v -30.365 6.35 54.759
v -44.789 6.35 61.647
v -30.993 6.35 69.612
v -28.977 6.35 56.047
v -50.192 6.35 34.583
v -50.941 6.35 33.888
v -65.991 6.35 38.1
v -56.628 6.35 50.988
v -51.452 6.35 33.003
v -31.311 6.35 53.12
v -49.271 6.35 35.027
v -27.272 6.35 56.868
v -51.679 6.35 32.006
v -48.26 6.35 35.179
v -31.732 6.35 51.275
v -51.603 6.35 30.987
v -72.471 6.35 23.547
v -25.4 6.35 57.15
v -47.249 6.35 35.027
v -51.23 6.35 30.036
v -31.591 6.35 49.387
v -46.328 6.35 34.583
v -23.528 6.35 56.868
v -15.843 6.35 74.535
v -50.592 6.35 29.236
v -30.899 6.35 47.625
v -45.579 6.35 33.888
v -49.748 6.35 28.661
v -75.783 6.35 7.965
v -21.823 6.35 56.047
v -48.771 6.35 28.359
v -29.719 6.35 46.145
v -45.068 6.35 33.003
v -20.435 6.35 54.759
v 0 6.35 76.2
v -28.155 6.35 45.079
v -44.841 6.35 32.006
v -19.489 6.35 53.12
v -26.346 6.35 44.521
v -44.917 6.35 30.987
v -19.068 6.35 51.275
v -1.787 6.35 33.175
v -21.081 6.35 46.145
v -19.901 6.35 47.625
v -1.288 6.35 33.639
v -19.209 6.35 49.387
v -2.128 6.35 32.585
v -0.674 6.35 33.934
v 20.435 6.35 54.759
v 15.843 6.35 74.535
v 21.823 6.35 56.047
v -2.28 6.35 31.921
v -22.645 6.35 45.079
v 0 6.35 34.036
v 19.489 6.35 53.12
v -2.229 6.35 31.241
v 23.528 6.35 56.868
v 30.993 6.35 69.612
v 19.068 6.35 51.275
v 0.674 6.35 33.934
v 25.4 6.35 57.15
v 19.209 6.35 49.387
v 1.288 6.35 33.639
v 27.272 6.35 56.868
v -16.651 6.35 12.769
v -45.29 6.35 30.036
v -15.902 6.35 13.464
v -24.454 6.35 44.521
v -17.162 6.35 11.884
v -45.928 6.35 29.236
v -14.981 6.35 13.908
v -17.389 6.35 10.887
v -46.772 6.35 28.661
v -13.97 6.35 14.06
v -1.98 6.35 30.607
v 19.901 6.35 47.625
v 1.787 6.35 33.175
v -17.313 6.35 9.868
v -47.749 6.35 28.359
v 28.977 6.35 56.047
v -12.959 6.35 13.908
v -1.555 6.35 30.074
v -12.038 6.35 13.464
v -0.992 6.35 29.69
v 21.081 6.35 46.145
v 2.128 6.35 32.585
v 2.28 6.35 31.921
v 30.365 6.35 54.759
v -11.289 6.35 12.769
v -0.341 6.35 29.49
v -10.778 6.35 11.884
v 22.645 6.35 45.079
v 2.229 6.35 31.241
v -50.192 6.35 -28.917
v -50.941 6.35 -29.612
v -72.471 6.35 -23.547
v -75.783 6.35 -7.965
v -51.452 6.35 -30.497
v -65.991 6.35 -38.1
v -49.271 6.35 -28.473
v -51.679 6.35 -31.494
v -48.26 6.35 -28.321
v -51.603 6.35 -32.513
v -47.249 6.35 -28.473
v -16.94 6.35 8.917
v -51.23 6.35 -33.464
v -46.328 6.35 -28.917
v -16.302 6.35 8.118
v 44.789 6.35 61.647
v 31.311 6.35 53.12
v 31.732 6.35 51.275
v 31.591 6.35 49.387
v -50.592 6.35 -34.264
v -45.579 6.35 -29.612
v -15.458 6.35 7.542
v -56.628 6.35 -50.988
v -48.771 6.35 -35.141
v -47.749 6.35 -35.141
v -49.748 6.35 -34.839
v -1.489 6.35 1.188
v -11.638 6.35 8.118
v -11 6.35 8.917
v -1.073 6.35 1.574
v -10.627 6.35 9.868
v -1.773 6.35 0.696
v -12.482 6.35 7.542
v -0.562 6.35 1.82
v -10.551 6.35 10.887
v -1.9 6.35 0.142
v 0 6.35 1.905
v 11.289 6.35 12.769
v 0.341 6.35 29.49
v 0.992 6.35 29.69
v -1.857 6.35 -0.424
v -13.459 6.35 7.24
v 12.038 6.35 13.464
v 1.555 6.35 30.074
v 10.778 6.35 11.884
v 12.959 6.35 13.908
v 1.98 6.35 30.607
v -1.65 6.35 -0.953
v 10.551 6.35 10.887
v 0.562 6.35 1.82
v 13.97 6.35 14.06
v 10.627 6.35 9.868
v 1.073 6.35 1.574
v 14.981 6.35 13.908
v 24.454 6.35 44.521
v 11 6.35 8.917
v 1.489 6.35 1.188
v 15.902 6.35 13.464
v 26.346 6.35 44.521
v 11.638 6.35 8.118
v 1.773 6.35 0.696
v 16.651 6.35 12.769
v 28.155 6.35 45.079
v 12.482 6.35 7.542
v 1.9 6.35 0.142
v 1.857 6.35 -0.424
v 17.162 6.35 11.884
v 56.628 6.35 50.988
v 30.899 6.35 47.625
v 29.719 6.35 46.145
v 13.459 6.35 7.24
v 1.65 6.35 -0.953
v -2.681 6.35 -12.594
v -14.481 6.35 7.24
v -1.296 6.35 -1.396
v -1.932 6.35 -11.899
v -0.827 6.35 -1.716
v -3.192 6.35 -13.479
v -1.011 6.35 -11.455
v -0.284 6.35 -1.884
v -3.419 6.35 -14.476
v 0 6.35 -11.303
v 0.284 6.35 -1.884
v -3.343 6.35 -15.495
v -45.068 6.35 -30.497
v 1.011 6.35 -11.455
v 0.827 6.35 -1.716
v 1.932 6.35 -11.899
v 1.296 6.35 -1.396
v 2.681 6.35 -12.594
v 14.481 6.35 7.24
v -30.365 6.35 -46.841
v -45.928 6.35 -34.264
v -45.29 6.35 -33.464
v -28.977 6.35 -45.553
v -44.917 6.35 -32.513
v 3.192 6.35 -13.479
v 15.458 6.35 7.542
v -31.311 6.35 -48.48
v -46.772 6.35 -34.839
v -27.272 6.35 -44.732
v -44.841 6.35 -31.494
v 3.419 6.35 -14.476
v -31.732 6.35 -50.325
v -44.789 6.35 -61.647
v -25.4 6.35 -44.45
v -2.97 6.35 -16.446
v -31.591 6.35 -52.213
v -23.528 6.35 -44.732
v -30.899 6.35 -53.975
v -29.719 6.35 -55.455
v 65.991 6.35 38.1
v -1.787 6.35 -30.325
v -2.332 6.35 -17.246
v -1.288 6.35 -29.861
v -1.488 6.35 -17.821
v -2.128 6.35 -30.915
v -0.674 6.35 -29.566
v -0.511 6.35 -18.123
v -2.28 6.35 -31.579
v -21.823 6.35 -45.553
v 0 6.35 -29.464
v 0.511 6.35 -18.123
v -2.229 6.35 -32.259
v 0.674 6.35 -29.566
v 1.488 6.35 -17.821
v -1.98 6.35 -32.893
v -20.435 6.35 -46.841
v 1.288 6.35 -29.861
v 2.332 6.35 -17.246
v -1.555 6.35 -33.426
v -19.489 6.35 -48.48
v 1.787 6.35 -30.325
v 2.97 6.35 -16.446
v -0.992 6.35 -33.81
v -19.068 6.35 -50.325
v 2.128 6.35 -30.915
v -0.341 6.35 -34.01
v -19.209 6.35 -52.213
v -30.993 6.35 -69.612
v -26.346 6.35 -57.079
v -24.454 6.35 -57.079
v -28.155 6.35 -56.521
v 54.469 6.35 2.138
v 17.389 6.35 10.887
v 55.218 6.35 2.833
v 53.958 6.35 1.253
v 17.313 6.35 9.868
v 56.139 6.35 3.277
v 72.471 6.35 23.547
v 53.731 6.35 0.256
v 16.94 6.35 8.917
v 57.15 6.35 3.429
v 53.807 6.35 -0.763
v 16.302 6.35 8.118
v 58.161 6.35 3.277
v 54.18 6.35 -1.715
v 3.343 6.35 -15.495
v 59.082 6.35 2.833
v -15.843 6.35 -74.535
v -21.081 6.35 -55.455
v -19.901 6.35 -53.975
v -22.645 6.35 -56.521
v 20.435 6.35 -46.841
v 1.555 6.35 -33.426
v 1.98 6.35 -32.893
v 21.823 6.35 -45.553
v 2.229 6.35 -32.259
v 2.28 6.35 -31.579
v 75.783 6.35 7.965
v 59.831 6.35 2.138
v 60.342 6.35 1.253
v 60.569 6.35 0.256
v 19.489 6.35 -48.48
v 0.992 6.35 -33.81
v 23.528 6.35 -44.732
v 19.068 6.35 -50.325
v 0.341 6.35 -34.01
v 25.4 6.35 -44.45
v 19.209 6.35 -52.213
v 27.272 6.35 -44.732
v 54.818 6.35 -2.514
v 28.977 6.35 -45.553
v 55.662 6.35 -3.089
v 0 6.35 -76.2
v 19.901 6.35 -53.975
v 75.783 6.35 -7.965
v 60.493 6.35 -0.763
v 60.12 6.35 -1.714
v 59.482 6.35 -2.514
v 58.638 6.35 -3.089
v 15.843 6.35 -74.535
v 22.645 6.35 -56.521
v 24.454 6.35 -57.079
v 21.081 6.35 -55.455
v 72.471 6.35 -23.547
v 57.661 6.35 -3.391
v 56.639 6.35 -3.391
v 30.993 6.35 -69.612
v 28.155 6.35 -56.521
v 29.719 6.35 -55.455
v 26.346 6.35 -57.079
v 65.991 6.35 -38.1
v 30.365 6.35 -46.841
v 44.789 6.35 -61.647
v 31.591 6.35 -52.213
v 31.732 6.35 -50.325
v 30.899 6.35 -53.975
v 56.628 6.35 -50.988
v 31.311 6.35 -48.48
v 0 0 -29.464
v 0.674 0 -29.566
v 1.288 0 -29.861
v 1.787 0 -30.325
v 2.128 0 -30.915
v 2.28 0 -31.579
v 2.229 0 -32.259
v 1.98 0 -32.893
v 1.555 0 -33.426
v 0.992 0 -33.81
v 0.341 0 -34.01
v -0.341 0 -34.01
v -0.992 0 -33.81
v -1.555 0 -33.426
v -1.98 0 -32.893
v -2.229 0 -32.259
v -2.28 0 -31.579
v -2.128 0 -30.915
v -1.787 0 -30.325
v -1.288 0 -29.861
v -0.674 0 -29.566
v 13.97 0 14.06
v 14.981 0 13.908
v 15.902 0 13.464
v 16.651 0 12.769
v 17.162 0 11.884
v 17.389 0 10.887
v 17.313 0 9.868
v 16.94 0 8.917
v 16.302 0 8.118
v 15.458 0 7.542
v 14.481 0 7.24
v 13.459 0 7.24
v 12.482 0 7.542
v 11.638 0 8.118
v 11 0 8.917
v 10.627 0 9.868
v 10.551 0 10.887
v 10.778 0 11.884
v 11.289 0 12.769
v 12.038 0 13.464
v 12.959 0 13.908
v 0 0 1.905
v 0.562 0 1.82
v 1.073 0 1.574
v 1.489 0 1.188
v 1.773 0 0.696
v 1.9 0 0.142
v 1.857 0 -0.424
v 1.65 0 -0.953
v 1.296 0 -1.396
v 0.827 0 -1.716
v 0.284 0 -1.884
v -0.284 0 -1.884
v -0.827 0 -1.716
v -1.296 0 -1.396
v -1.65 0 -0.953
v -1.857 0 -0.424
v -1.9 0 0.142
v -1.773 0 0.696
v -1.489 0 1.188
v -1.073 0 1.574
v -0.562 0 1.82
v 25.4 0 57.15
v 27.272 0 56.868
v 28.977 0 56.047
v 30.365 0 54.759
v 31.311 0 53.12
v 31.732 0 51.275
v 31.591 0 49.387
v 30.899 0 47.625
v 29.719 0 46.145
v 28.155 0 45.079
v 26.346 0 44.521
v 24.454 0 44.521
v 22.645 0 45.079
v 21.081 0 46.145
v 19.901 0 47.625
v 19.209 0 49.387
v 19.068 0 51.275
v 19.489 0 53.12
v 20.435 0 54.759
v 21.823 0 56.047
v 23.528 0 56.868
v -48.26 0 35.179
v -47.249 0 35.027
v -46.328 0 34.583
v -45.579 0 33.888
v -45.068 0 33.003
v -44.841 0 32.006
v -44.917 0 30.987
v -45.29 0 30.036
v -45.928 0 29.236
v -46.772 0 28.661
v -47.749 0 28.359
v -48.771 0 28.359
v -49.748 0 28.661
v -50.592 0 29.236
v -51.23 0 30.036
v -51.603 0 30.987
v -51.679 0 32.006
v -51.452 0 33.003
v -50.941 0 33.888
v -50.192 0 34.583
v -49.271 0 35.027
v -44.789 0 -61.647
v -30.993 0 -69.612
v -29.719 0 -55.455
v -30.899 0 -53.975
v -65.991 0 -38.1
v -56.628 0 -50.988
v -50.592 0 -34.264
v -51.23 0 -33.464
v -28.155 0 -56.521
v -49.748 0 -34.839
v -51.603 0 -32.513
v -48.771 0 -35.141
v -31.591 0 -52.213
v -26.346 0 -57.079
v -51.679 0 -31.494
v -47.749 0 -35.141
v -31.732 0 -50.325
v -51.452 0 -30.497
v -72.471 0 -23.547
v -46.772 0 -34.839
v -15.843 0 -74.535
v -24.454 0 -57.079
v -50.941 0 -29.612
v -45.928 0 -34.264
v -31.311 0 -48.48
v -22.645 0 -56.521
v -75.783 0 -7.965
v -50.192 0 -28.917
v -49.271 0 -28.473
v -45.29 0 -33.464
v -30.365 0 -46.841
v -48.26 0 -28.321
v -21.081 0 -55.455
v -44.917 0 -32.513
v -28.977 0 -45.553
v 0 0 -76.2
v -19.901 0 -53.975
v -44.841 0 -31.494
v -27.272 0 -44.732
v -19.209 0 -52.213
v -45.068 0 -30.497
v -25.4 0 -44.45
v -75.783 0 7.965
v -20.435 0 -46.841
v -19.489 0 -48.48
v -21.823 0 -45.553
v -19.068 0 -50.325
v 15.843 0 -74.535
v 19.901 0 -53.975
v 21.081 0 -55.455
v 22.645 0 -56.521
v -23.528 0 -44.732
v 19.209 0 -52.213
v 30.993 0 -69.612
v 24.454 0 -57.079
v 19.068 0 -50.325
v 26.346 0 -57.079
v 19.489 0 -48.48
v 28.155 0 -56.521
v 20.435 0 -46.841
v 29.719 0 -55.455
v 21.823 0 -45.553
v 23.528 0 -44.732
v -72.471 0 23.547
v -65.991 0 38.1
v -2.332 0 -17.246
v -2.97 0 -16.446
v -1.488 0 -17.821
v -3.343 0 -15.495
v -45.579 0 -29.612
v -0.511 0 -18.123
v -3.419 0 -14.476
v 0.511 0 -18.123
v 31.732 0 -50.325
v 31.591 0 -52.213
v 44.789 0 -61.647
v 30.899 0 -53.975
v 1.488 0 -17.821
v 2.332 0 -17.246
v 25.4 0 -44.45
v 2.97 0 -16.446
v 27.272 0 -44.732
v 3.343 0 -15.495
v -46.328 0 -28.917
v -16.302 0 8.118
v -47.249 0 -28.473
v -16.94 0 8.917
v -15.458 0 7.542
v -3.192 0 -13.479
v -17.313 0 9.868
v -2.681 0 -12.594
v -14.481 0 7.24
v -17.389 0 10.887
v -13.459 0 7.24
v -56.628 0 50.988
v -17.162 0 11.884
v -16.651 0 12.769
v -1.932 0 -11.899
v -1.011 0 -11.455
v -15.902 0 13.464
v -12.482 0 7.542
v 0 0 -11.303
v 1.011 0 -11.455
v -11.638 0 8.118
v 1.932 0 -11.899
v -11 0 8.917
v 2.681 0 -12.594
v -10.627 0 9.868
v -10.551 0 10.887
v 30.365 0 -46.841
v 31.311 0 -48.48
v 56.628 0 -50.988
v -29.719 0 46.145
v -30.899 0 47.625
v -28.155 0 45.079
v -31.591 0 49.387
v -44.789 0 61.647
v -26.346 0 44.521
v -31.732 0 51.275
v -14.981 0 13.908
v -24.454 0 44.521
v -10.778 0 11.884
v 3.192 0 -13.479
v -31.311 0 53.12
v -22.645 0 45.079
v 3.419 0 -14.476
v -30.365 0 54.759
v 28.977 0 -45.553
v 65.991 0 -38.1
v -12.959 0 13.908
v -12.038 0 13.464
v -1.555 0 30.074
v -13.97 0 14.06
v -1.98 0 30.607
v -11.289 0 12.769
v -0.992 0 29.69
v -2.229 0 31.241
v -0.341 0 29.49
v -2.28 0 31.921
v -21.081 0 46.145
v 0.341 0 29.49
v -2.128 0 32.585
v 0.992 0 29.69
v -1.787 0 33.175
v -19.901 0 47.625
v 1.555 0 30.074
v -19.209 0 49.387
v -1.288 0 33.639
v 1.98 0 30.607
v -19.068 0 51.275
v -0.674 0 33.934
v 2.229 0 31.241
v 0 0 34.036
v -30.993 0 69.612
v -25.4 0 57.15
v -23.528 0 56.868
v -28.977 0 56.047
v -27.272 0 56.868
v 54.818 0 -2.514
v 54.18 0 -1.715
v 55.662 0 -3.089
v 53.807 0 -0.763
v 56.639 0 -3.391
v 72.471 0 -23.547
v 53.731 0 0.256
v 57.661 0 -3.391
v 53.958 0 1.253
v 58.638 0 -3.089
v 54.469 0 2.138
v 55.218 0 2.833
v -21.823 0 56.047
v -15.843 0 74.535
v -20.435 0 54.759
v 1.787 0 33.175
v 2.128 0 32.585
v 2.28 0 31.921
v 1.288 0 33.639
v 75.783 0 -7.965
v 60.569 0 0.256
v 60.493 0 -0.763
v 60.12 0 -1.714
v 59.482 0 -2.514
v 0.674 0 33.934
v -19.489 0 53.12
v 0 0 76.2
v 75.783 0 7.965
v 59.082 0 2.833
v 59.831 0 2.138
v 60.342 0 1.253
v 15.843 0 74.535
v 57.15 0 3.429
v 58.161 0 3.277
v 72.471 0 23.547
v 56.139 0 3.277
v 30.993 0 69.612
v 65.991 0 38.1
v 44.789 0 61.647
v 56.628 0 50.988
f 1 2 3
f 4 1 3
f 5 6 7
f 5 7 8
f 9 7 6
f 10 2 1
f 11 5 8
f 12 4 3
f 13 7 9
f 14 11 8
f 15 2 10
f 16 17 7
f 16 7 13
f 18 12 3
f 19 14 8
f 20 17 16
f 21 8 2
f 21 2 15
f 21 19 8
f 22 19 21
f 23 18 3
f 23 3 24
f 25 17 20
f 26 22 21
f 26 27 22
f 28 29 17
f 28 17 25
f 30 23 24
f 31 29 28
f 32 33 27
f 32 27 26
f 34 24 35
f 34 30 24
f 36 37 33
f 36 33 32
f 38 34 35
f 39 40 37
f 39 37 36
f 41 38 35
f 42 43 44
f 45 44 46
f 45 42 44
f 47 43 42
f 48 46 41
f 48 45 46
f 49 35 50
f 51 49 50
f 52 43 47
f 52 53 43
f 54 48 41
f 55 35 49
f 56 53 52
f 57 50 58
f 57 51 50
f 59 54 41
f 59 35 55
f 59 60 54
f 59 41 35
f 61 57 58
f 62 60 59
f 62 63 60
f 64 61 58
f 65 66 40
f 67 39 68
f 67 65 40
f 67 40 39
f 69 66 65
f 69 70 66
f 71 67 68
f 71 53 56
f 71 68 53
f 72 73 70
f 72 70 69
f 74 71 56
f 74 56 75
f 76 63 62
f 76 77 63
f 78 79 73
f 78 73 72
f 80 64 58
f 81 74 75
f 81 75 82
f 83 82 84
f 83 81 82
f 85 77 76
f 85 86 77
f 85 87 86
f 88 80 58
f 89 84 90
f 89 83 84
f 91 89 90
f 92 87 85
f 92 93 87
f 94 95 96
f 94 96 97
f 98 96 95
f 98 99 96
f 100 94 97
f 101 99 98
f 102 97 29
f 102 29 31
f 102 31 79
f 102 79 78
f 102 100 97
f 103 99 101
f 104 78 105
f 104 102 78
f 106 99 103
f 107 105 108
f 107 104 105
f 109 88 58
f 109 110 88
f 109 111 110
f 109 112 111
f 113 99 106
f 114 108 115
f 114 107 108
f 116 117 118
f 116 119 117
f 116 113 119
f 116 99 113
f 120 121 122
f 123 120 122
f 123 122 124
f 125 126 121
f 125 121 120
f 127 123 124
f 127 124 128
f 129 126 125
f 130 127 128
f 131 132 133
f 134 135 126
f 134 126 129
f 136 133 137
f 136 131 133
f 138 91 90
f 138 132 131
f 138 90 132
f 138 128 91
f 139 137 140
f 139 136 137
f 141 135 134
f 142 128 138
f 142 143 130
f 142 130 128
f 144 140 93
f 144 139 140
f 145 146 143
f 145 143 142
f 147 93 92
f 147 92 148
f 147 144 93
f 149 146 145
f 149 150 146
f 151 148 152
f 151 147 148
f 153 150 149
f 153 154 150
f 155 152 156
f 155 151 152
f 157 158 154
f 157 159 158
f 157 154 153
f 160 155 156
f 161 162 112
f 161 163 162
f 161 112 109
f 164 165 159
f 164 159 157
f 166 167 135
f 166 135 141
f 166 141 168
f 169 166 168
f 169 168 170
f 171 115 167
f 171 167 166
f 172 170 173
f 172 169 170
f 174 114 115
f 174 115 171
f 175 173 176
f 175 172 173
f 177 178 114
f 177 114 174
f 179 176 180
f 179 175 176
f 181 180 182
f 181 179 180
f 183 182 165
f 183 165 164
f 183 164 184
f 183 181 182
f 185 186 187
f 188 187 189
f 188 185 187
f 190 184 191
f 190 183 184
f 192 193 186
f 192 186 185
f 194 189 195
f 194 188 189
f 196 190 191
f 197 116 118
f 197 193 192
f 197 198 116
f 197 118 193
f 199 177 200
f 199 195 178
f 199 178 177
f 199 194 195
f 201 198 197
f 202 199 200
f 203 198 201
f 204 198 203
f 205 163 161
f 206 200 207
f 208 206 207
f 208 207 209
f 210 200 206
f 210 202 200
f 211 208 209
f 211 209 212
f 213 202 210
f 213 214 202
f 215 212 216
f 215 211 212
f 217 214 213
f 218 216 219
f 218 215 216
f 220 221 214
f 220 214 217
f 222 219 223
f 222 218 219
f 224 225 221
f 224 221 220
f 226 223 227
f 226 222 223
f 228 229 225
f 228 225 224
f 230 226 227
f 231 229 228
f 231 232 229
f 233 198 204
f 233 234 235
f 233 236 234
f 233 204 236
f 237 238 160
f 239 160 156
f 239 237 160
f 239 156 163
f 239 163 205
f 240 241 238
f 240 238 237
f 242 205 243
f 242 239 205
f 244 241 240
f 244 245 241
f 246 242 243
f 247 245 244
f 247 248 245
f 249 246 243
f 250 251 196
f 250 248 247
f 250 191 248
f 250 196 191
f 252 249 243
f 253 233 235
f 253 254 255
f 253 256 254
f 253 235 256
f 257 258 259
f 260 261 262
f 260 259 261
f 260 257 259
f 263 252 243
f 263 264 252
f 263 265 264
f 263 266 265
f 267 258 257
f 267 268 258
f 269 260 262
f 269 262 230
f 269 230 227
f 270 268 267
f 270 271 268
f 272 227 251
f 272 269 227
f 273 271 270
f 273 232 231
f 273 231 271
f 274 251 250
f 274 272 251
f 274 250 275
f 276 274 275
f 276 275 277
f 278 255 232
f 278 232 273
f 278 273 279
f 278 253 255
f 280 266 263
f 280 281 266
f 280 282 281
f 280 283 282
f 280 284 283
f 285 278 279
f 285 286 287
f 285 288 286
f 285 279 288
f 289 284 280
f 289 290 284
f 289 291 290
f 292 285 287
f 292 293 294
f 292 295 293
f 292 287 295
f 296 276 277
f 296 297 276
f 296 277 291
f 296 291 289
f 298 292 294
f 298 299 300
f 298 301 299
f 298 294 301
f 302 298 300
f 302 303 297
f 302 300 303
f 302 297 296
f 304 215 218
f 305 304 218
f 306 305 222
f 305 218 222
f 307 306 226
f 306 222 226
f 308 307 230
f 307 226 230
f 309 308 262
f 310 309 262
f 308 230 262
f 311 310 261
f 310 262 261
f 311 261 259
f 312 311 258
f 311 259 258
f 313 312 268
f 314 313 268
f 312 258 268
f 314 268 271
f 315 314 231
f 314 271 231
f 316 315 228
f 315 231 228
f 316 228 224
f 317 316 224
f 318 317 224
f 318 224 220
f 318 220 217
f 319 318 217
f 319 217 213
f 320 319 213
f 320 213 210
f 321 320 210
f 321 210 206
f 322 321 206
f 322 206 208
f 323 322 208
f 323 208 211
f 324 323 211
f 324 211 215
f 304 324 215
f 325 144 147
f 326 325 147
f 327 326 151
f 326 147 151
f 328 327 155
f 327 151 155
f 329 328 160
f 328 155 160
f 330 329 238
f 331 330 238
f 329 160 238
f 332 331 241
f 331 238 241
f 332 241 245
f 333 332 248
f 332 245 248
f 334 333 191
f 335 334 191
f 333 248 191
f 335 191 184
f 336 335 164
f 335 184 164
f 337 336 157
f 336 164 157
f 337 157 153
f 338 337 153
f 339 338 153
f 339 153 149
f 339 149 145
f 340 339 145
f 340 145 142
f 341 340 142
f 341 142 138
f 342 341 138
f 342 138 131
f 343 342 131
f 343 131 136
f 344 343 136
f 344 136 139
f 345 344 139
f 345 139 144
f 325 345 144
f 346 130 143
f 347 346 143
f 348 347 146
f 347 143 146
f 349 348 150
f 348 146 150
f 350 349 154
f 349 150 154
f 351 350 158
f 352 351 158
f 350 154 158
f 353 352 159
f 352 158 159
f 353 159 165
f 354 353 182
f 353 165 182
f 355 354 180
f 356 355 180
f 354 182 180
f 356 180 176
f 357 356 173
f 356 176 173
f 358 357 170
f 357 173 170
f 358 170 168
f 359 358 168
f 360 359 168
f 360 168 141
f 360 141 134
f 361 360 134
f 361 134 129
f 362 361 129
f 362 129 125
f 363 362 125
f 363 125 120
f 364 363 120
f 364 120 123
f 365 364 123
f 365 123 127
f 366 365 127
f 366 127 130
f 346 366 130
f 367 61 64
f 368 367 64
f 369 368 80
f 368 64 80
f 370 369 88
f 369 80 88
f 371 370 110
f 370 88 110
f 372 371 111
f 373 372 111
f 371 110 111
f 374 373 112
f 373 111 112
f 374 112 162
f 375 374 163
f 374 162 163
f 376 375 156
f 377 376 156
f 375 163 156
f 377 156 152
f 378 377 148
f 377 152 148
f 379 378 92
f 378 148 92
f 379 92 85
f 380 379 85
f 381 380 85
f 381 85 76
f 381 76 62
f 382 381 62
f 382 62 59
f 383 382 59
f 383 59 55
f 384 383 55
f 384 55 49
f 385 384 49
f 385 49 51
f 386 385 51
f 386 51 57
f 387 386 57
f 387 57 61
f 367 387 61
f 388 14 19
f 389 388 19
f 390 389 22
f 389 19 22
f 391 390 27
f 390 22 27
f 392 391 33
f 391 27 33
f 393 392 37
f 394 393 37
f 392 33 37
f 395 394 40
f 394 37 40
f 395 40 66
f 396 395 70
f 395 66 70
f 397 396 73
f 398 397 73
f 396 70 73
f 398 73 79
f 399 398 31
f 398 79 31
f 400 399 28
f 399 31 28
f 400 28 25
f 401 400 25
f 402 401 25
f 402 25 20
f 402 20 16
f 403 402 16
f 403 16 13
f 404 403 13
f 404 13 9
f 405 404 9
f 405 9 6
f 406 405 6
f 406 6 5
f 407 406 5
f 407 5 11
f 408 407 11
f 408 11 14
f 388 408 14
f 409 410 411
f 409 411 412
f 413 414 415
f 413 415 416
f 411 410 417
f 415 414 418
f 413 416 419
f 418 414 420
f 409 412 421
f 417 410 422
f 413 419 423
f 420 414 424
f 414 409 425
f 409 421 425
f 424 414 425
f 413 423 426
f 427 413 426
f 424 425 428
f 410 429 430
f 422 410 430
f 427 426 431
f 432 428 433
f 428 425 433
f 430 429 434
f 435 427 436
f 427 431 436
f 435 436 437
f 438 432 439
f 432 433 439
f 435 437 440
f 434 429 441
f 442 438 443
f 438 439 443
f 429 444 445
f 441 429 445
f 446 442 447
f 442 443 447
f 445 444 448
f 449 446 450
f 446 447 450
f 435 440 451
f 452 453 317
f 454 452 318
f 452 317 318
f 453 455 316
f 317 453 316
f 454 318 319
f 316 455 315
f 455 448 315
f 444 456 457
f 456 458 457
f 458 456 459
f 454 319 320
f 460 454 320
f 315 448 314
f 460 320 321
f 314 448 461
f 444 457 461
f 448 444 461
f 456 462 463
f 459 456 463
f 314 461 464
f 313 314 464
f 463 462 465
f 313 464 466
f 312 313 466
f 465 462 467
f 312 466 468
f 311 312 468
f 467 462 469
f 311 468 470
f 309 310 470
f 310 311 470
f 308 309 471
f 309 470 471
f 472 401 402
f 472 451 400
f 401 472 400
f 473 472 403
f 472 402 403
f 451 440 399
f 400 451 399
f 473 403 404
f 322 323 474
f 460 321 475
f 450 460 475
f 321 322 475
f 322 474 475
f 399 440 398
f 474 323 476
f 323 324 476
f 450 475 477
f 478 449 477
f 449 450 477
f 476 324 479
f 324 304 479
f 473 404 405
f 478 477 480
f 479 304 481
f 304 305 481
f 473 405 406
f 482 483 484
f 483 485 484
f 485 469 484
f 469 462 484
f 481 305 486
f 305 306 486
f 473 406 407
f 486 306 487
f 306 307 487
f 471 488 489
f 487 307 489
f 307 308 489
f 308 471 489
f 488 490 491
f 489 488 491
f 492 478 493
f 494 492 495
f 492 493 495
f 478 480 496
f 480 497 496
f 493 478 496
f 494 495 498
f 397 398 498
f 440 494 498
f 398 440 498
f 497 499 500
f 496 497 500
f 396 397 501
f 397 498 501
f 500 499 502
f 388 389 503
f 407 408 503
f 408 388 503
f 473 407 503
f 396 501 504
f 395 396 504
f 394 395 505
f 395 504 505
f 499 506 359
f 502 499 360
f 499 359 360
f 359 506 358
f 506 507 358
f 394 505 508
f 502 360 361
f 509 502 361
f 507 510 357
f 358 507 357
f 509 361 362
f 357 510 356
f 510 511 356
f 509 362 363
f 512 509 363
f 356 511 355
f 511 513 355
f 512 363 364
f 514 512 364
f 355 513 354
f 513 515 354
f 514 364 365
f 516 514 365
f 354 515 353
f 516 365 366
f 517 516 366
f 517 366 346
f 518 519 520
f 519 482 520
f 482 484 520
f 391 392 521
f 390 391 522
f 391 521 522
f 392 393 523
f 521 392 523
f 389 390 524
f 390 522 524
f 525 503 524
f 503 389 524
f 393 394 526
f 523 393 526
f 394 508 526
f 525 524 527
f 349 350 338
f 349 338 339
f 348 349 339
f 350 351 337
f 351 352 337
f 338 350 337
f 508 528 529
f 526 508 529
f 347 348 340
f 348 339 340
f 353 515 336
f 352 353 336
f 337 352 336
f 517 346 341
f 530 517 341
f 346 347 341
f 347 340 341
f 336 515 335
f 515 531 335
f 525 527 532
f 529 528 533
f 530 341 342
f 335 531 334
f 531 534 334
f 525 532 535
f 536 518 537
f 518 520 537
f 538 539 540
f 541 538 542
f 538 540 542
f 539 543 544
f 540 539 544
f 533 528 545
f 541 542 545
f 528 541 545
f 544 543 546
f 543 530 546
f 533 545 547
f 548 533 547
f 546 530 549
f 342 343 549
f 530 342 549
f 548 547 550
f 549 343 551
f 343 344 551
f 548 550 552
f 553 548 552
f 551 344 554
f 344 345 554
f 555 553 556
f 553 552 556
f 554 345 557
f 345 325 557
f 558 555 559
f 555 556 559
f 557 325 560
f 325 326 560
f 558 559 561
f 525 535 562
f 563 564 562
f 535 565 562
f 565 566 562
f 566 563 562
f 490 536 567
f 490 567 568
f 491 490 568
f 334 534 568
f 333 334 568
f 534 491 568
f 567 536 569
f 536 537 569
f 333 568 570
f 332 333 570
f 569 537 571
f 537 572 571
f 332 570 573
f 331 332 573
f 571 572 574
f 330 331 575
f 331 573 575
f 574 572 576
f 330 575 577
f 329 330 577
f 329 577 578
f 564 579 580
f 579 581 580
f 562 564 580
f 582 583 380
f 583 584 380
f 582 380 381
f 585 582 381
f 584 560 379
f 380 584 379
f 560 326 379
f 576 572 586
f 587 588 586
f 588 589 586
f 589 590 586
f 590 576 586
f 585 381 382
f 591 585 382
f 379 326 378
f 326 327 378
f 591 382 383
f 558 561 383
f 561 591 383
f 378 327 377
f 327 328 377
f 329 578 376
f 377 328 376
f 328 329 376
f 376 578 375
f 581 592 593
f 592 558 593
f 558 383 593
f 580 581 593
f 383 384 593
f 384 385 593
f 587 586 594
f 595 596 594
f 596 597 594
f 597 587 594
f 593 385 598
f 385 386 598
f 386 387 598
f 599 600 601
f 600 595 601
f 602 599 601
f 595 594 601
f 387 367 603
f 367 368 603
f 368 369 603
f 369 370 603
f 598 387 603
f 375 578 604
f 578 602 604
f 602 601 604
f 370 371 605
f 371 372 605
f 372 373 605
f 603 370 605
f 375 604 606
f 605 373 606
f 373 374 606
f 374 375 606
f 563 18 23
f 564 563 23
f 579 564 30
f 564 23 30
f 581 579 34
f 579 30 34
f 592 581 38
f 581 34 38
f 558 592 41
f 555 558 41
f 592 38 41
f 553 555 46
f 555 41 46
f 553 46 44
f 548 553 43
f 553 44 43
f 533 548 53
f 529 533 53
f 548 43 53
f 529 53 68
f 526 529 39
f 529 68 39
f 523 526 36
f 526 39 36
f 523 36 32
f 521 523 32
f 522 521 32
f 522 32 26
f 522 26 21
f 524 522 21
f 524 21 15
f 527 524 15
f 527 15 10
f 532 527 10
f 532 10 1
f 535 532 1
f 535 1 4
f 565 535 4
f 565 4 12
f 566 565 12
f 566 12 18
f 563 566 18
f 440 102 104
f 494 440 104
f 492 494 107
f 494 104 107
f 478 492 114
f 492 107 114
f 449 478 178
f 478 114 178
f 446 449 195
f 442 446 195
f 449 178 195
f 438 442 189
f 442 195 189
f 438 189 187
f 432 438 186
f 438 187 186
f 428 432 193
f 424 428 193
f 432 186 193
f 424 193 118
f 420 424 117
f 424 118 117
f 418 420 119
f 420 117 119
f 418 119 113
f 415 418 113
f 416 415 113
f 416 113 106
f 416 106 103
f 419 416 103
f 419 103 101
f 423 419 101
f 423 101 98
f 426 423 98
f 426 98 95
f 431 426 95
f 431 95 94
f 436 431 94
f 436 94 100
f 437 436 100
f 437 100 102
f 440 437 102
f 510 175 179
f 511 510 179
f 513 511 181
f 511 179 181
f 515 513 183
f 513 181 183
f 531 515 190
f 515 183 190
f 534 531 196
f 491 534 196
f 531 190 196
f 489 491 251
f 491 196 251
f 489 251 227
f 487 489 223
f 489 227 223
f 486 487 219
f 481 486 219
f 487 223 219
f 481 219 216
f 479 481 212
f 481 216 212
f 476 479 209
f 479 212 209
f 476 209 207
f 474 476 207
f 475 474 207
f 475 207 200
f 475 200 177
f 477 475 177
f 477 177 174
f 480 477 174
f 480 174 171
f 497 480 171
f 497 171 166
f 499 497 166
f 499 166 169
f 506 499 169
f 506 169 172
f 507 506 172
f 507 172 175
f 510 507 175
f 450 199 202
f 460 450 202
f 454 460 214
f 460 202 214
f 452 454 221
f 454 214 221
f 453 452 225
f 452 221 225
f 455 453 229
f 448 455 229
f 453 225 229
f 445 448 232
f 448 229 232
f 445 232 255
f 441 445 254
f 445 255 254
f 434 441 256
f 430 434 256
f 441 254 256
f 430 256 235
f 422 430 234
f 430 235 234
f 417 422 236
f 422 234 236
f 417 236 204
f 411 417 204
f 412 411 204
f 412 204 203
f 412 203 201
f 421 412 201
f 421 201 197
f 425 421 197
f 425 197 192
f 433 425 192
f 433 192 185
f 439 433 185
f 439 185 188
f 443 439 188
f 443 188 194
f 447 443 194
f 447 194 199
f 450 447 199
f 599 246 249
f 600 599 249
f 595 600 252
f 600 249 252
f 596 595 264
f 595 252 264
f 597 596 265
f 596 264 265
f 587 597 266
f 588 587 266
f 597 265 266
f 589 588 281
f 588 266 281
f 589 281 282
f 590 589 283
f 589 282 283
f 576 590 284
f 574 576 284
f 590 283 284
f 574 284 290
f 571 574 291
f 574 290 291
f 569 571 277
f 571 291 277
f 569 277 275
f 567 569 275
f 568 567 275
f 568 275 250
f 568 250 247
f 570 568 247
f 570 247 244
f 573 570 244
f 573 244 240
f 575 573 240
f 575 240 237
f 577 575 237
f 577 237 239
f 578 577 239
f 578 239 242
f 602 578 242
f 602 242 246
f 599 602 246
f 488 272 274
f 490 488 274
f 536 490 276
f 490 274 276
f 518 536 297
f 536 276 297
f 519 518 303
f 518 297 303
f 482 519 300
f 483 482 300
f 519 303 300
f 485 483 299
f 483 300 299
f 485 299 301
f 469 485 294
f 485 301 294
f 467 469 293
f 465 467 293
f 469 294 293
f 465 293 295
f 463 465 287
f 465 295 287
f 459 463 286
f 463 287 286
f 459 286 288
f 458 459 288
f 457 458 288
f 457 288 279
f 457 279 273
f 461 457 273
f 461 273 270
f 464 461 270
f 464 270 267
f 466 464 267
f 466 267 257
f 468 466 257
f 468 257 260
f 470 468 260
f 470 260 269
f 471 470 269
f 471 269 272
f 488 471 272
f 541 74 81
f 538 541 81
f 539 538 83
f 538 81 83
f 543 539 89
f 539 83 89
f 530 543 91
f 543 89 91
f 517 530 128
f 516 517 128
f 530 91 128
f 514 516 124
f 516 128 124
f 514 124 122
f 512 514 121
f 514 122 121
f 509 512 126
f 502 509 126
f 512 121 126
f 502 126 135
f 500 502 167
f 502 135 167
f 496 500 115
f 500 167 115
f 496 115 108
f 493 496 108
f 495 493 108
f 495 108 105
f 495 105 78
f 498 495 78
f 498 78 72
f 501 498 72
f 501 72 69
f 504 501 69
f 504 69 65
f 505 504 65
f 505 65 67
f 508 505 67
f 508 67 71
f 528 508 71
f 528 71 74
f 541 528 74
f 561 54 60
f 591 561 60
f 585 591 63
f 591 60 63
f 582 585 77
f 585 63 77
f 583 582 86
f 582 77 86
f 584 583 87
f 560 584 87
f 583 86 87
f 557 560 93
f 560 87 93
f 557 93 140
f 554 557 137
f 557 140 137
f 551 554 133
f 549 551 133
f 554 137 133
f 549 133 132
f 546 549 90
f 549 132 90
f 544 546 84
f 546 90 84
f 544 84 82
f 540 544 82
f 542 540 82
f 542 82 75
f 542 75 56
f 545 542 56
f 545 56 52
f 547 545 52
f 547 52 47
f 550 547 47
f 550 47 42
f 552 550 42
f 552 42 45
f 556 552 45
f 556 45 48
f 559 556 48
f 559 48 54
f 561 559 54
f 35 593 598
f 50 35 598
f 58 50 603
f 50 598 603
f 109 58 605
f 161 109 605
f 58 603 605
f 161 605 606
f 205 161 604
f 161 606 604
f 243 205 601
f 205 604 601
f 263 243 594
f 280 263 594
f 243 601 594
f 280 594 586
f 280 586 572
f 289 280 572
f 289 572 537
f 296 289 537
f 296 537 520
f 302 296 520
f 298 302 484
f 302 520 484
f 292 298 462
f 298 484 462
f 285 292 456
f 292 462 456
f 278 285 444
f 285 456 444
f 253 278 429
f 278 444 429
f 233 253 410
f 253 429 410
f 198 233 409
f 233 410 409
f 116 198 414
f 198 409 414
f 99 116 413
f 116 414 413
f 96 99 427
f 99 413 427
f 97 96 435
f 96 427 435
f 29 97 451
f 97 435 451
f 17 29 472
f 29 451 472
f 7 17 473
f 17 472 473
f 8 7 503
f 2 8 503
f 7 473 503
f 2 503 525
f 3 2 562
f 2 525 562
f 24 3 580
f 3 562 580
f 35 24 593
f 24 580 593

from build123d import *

# Parameters (mm, degrees)
SKETCH1_R           = 76.2
BOSS_EXTRUDE1_DEPTH = 6.35
SKETCH2_R           = 1.905
CUT_EXTRUDE1_DEPTH  = 108.95
SKETCH3_R           = 3.429
CUT_EXTRUDE2_DEPTH  = 108.95
SKETCH4_R           = 6.35
CUT_EXTRUDE3_DEPTH  = 108.95
SKETCH5_R           = 6.35
CUT_EXTRUDE4_DEPTH  = 108.95
SKETCH7_R           = 2.54
CUT_EXTRUDE6_DEPTH  = 108.95
SKETCH8_R           = 3.429
CUT_EXTRUDE7_DEPTH  = 108.95
SKETCH9_R           = 3.429
CUT_EXTRUDE8_DEPTH  = 108.95
SKETCH10_R          = 2.54
BOSS_EXTRUDE2_DEPTH = 6.35
SKETCH11_R          = 2.286
CUT_EXTRUDE9_DEPTH  = 108.95


with BuildPart() as part:
    # Sketch1 → Boss-Extrude1 (new body)
    with BuildSketch(Plane(origin=(0, 0, 0), x_dir=(1, 0, 0), z_dir=(0, 1, 0))):
        with Locations(Location((0, 0, 0), (0, 0, 270))):
            Circle(SKETCH1_R)
    extrude(amount=BOSS_EXTRUDE1_DEPTH)

    # Sketch2 → Cut-Extrude1 (cut, through all)
    with BuildSketch(Plane(origin=(0, 6.35, 0), x_dir=(1, 0, 0), z_dir=(0, 1, 0))):
        with Locations(Location((0, 0, 0), (0, 0, 270))):
            Circle(SKETCH2_R)
    extrude(amount=-CUT_EXTRUDE1_DEPTH, mode=Mode.SUBTRACT)

    # Sketch3 → Cut-Extrude2 (cut, through all)
    with BuildSketch(Plane(origin=(0, 6.35, 0), x_dir=(1, 0, 0), z_dir=(0, 1, 0))):
        with Locations(Location((0, 14.732, 0), (0, 0, 270))):
            Circle(SKETCH3_R)
        with Locations(Location((-13.97, -10.631143259, 0), (0, 0, 270))):
            Circle(SKETCH3_R)
        with Locations(Location((13.97, -10.631143259, 0), (0, 0, 270))):
            Circle(SKETCH3_R)
    extrude(amount=-CUT_EXTRUDE2_DEPTH, mode=Mode.SUBTRACT)

    # Sketch4 → Cut-Extrude3 (cut, through all)
    with BuildSketch(Plane(origin=(0, 6.35, 0), x_dir=(1, 0, 0), z_dir=(0, 1, 0))):
        with Locations(Location((-25.4, -50.8, 0), (0, 0, 270))):
            Circle(SKETCH4_R)
        with Locations(Location((25.4, -50.8, 0), (0, 0, 270))):
            Circle(SKETCH4_R)
    extrude(amount=-CUT_EXTRUDE3_DEPTH, mode=Mode.SUBTRACT)

    # Sketch5 → Cut-Extrude4 (cut, through all)
    with BuildSketch(Plane(origin=(0, 6.35, 0), x_dir=(1, 0, 0), z_dir=(0, 1, 0))):
        with Locations(Location((-25.4, 50.8, 0), (0, 0, 270))):
            Circle(SKETCH5_R)
        with Locations(Location((25.4, 50.8, 0), (0, 0, 270))):
            Circle(SKETCH5_R)
    extrude(amount=-CUT_EXTRUDE4_DEPTH, mode=Mode.SUBTRACT)

    # Sketch7 → Cut-Extrude6 (cut, through all)
    with BuildSketch(Plane(origin=(0, 6.35, 0), x_dir=(1, 0, 0), z_dir=(0, 1, 0))):
        with Locations(Location((0, 46.99, 0), (0, 0, 270))):
            Circle(SKETCH7_R)
        with Locations(Location((0, -46.99, 0), (0, 0, 270))):
            Circle(SKETCH7_R)
    extrude(amount=-CUT_EXTRUDE6_DEPTH, mode=Mode.SUBTRACT)

    # Sketch8 → Cut-Extrude7 (cut, through all)
    with BuildSketch(Plane(origin=(0, 6.35, 0), x_dir=(1, 0, 0), z_dir=(0, 1, 0))):
        with Locations(Location((57.15, 0, 0), (0, 0, 270))):
            Circle(SKETCH8_R)
    extrude(amount=-CUT_EXTRUDE7_DEPTH, mode=Mode.SUBTRACT)

    # Sketch9 → Cut-Extrude8 (cut, through all)
    with BuildSketch(Plane(origin=(0, 6.35, 0), x_dir=(1, 0, 0), z_dir=(0, 1, 0))):
        with Locations(Location((-48.26, -31.75, 0), (0, 0, 270))):
            Circle(SKETCH9_R)
        with Locations(Location((-48.26, 31.75, 0), (0, 0, 270))):
            Circle(SKETCH9_R)
    extrude(amount=-CUT_EXTRUDE8_DEPTH, mode=Mode.SUBTRACT)

    # Sketch10 → Boss-Extrude2 (add)
    with BuildSketch(Plane(origin=(0, 6.35, 0), x_dir=(1, 0, 0), z_dir=(0, 1, 0))):
        with Locations((0, 46.99)):
            Circle(SKETCH10_R)
        with Locations((0, -46.99)):
            Circle(SKETCH10_R)
    extrude(amount=-BOSS_EXTRUDE2_DEPTH)

    # Sketch11 → Cut-Extrude9 (cut, through all)
    with BuildSketch(Plane(origin=(0, 6.35, 0), x_dir=(1, 0, 0), z_dir=(0, 1, 0))):
        with Locations(Location((0, -31.75, 0), (0, 0, 270))):
            Circle(SKETCH11_R)
        with Locations(Location((0, 31.75, 0), (0, 0, 270))):
            Circle(SKETCH11_R)
    extrude(amount=-CUT_EXTRUDE9_DEPTH, mode=Mode.SUBTRACT)


solid = part.part
